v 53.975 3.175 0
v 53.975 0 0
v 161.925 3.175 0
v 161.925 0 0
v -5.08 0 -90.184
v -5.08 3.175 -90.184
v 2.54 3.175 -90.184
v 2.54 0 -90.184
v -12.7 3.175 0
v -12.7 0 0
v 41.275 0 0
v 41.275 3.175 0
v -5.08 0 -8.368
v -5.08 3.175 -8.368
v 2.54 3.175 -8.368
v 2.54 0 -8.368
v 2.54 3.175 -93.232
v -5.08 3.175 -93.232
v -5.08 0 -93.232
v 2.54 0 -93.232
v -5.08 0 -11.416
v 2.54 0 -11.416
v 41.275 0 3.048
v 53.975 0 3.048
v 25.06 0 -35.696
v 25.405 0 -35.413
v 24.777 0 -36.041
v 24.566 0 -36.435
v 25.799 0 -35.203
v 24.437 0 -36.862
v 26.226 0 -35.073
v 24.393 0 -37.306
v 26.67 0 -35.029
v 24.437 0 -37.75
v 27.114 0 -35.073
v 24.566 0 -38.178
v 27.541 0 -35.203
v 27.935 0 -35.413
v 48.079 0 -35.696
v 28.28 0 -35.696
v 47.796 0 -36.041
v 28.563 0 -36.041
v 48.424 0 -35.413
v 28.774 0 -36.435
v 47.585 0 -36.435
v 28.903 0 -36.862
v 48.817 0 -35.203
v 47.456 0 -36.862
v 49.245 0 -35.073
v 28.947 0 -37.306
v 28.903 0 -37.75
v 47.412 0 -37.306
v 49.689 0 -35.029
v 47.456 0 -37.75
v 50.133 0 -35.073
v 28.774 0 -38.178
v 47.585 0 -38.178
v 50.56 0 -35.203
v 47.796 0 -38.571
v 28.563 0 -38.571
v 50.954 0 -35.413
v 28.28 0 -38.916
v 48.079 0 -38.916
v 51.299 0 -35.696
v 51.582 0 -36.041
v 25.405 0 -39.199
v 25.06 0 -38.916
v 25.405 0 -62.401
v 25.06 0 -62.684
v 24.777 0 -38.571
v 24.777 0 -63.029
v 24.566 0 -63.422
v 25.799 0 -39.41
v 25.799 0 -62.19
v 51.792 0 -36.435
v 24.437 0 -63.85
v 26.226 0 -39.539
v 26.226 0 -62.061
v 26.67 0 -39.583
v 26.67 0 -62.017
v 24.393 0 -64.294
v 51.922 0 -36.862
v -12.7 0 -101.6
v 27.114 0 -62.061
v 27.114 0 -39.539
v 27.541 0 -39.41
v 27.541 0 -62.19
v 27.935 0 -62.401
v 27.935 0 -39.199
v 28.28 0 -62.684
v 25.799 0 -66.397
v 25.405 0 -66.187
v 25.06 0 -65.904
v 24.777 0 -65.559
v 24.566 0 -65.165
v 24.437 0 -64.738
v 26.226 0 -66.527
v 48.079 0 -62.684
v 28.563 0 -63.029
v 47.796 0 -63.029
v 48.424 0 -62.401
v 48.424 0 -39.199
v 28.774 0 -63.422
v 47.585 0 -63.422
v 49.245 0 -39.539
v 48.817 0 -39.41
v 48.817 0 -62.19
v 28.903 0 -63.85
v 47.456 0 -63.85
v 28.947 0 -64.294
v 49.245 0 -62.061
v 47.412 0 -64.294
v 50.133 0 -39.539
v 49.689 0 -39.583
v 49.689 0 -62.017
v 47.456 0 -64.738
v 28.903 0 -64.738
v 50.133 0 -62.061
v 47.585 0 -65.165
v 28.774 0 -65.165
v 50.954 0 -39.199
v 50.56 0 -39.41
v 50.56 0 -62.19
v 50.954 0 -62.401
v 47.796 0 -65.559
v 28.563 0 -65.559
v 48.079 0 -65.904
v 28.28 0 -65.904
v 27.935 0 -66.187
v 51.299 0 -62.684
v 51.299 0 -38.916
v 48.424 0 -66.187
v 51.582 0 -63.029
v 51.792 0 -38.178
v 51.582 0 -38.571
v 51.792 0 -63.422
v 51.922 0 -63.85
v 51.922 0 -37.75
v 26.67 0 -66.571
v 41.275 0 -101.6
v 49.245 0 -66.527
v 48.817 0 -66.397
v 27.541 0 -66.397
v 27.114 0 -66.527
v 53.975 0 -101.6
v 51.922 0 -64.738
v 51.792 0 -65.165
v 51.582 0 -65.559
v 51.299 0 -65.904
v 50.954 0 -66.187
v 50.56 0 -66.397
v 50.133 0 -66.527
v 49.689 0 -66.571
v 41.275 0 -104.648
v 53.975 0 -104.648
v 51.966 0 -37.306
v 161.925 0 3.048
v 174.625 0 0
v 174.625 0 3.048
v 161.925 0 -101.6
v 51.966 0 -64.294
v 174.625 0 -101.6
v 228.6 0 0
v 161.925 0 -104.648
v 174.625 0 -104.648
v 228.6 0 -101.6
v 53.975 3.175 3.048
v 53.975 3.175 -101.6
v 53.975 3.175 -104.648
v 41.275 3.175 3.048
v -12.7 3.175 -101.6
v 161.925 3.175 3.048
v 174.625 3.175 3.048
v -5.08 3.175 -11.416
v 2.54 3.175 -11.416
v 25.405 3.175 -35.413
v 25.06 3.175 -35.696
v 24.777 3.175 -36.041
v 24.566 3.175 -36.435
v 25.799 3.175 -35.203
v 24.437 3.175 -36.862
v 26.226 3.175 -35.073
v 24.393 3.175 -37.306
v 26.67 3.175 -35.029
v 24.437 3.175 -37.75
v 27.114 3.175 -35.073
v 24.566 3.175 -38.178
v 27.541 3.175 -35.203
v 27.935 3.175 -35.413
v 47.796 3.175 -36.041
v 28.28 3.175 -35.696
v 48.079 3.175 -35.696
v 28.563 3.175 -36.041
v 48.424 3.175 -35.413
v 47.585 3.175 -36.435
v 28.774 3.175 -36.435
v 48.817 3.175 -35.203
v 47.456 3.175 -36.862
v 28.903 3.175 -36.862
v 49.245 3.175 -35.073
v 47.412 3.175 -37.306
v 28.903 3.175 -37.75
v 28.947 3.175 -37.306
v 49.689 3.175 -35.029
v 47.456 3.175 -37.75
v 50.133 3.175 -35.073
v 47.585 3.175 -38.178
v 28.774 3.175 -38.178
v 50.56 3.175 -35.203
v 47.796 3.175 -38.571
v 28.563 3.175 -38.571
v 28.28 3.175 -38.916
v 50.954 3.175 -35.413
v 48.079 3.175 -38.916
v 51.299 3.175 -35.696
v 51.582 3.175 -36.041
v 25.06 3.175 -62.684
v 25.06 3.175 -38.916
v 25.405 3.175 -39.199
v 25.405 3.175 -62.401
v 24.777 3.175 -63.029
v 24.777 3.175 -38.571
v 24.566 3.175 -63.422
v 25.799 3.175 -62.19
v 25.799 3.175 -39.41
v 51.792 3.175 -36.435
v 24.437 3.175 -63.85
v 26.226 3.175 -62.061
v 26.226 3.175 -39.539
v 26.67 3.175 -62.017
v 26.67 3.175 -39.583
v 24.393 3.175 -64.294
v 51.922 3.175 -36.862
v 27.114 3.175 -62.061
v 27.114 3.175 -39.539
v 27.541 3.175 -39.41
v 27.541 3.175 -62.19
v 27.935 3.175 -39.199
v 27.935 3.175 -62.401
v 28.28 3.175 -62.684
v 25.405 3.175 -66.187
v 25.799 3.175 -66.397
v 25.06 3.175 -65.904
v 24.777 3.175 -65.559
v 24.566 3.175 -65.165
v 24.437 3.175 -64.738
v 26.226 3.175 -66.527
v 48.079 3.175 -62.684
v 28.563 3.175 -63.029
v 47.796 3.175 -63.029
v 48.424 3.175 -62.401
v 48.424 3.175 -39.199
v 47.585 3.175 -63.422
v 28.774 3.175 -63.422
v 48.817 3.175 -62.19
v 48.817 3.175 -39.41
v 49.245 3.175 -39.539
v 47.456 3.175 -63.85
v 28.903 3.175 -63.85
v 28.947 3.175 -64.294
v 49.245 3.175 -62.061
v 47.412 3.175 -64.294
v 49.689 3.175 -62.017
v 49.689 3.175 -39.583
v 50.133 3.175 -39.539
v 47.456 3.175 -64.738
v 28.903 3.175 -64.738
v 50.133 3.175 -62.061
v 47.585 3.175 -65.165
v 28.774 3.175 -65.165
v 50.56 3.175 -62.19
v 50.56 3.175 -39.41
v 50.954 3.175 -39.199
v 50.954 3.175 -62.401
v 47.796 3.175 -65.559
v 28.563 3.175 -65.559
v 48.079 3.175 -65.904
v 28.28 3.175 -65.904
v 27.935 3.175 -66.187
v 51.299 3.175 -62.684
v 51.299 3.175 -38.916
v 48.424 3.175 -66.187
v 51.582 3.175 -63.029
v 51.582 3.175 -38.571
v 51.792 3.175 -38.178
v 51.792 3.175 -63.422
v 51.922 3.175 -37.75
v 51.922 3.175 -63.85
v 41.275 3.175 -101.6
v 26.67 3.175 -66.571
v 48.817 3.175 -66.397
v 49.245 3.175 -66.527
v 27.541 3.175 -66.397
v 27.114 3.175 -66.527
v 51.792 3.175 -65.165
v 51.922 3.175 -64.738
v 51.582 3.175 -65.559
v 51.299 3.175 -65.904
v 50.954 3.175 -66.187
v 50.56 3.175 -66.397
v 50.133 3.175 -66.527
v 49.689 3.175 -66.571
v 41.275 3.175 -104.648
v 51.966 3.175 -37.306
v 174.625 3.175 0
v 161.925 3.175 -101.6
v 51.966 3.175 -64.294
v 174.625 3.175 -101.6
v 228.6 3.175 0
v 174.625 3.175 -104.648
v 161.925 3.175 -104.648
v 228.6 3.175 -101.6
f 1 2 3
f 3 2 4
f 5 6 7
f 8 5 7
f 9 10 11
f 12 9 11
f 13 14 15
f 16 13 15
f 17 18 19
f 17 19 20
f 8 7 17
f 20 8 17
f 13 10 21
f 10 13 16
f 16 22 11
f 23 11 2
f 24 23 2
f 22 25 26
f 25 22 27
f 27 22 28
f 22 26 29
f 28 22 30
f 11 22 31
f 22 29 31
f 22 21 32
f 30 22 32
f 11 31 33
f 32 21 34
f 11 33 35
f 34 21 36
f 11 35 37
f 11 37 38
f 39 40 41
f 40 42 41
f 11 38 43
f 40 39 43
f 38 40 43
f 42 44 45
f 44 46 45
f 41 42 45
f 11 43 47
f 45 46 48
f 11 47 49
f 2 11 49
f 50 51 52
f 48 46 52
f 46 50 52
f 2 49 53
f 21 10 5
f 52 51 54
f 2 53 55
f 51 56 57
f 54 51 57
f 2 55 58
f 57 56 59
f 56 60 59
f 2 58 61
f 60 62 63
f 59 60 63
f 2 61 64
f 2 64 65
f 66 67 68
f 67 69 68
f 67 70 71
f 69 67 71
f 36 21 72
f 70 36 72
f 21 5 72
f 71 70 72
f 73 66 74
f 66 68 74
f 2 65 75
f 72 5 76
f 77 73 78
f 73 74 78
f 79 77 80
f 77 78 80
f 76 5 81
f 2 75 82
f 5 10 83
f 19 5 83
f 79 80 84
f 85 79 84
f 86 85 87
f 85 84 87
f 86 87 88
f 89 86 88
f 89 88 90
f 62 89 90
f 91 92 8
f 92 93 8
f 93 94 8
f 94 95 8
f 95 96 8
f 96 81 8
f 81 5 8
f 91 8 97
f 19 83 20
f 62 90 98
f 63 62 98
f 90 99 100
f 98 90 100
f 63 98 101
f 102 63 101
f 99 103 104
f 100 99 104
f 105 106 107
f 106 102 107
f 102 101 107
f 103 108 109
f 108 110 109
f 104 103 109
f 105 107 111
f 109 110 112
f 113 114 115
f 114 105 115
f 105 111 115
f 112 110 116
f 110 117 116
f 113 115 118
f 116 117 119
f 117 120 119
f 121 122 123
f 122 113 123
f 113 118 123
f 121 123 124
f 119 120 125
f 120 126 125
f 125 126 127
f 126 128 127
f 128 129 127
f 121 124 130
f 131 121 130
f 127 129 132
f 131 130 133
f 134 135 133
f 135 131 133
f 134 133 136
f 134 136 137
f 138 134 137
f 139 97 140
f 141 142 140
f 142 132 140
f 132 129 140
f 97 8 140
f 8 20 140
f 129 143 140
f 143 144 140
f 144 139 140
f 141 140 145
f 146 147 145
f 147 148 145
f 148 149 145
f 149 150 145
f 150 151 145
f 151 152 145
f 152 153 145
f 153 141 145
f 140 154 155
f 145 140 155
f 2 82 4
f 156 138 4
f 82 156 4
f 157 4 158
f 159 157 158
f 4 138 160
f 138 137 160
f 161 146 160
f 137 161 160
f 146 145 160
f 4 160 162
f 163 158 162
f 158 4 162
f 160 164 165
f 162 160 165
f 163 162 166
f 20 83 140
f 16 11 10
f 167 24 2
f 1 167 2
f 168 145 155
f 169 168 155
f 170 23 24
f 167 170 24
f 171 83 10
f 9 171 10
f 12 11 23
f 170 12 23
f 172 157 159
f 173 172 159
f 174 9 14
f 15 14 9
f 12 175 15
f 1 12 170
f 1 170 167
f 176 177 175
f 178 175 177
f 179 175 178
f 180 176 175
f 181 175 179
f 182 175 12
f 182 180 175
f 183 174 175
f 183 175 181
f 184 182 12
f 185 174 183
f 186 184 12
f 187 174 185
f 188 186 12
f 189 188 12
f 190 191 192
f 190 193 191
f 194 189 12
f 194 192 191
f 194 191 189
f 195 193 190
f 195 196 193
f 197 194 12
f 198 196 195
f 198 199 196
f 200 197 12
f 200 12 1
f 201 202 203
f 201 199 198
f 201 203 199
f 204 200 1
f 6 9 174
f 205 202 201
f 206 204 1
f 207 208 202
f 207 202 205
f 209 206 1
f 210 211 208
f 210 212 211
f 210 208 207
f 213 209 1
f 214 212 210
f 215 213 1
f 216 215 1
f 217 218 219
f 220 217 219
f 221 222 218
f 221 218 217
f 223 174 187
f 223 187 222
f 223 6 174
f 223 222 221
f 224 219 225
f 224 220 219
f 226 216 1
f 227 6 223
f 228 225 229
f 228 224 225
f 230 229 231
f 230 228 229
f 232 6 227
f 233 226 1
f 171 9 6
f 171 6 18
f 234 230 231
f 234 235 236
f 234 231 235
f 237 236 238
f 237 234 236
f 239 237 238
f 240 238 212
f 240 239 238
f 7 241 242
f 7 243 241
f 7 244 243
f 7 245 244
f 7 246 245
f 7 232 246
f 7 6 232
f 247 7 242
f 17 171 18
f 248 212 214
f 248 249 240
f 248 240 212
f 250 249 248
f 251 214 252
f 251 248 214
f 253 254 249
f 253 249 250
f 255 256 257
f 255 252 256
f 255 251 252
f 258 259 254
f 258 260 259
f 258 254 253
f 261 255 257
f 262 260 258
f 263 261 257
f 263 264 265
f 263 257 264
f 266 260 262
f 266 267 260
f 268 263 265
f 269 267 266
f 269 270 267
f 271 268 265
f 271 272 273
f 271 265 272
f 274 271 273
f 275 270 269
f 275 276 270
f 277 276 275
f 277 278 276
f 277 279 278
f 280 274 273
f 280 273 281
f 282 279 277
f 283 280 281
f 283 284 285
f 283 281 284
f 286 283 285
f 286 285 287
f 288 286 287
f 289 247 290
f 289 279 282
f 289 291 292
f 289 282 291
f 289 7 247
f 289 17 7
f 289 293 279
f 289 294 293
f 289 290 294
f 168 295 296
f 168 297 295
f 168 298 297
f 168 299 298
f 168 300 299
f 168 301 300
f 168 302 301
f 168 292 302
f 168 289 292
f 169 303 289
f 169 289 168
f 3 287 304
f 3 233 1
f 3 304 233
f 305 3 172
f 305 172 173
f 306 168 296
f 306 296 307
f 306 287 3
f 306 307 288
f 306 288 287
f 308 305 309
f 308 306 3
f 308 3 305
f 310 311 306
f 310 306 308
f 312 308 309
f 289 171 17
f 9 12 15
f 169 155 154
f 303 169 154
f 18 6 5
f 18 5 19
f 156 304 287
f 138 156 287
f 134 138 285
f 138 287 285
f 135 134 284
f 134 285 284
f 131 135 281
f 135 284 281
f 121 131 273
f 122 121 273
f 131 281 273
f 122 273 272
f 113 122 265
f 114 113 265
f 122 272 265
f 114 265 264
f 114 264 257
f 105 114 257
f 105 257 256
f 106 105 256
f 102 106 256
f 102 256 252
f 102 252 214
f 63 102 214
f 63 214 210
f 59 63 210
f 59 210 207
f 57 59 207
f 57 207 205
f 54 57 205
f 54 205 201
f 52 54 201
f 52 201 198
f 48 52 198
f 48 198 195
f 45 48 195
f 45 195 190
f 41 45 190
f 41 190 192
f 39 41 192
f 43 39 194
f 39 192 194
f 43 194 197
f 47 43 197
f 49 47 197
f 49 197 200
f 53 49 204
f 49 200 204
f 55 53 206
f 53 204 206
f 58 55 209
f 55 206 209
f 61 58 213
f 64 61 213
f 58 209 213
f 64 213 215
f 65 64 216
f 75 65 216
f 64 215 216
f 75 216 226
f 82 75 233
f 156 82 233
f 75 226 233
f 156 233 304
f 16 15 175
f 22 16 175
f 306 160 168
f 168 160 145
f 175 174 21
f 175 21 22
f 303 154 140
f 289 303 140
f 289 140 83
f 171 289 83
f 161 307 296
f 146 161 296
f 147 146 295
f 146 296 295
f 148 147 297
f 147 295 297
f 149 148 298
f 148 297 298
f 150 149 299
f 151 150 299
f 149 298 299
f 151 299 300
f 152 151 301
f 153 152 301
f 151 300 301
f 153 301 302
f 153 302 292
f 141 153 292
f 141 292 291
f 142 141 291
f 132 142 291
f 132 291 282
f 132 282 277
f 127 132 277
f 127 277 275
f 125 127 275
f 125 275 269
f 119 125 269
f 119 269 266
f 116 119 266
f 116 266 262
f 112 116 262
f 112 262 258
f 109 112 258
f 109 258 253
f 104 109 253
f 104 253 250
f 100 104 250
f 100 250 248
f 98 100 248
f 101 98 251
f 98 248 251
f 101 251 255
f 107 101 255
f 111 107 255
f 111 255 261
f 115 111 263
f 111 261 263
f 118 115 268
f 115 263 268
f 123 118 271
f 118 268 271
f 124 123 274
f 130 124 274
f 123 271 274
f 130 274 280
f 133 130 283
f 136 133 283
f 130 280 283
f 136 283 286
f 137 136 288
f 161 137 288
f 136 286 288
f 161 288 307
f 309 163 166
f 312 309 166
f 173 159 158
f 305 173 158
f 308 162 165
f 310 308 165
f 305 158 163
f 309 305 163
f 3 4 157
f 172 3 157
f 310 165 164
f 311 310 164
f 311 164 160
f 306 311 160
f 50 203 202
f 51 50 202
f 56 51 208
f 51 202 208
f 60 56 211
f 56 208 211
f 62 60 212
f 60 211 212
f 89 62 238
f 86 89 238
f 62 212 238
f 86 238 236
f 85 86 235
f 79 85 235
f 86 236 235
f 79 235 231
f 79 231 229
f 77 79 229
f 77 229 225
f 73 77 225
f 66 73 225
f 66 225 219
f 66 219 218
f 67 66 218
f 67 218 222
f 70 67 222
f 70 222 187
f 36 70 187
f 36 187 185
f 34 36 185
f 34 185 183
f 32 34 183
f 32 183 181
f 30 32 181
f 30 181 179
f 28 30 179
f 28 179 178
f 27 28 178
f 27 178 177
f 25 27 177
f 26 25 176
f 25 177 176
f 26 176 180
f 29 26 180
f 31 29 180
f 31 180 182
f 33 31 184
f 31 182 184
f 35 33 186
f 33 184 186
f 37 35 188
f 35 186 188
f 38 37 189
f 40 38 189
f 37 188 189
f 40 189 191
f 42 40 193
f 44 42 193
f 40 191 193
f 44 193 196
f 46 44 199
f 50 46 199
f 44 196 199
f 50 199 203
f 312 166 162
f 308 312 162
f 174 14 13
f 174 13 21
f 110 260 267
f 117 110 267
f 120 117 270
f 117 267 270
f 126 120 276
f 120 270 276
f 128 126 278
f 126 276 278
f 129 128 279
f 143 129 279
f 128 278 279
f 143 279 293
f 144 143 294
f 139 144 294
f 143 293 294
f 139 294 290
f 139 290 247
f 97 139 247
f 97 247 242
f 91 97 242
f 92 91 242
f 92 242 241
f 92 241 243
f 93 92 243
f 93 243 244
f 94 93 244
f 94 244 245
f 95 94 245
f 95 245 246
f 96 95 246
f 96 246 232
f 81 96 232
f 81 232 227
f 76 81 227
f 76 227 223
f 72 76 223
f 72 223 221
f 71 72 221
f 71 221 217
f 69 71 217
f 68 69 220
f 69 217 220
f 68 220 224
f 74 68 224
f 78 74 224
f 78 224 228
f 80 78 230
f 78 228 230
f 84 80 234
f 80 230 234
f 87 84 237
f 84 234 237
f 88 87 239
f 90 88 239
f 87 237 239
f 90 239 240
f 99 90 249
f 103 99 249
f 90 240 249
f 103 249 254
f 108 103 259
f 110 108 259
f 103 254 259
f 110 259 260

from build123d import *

# Parameters (mm, degrees)
MAIN_FRAME_DEPTH   = 3.175
SKETCH2_R          = 2.276969522
FRONT_WHEEL_DEPTH  = 4.175
SKETCH4_W          = 7.62
SKETCH4_H          = 3.048
SENSOR_HOLES_DEPTH = 4.175


with BuildPart() as part:
    # Sketch1 → Main Frame (new body)
    with BuildSketch(Plane(origin=(0, 0, 0), x_dir=(1, 0, 0), z_dir=(0, 1, 0))):
        Polygon((0, 0), (41.275, 0), (41.275, -3.048), (53.975, -3.048), (53.975, 0), (161.925, 0), (161.925, -3.048), (174.625, -3.048), (174.625, 0), (228.6, 0), (228.6, 101.6), (174.625, 101.6), (174.625, 104.648), (161.925, 104.648), (161.925, 101.6), (53.975, 101.6), (53.975, 104.648), (41.275, 104.648), (41.275, 101.6), (0, 101.6), (-12.7, 101.6), (-12.7, 0), align=None)
    extrude(amount=MAIN_FRAME_DEPTH)

    # Sketch2 → Front Wheel (cut, through all)
    with BuildSketch(Plane(origin=(0, 3.175, 0), x_dir=(1, 0, 0), z_dir=(0, 1, 0))):
        with Locations((26.67, 64.29375)):
            Circle(SKETCH2_R)
        with Locations((49.68875, 64.29375)):
            Circle(SKETCH2_R)
        with Locations((49.68875, 37.30625)):
            Circle(SKETCH2_R)
        with Locations((26.67, 37.30625)):
            Circle(SKETCH2_R)
    extrude(amount=-FRONT_WHEEL_DEPTH, mode=Mode.SUBTRACT)

    # Sketch4 → Sensor Holes (cut, through all)
    with BuildSketch(Plane(origin=(0, 3.175, 0), x_dir=(1, 0, 0), z_dir=(0, 1, 0))):
        with Locations((-1.27, 91.707882035)):
            Rectangle(SKETCH4_W, SKETCH4_H)
        with Locations((-1.27, 9.892117965)):
            Rectangle(SKETCH4_W, SKETCH4_H)
    extrude(amount=-SENSOR_HOLES_DEPTH, mode=Mode.SUBTRACT)


solid = part.part
